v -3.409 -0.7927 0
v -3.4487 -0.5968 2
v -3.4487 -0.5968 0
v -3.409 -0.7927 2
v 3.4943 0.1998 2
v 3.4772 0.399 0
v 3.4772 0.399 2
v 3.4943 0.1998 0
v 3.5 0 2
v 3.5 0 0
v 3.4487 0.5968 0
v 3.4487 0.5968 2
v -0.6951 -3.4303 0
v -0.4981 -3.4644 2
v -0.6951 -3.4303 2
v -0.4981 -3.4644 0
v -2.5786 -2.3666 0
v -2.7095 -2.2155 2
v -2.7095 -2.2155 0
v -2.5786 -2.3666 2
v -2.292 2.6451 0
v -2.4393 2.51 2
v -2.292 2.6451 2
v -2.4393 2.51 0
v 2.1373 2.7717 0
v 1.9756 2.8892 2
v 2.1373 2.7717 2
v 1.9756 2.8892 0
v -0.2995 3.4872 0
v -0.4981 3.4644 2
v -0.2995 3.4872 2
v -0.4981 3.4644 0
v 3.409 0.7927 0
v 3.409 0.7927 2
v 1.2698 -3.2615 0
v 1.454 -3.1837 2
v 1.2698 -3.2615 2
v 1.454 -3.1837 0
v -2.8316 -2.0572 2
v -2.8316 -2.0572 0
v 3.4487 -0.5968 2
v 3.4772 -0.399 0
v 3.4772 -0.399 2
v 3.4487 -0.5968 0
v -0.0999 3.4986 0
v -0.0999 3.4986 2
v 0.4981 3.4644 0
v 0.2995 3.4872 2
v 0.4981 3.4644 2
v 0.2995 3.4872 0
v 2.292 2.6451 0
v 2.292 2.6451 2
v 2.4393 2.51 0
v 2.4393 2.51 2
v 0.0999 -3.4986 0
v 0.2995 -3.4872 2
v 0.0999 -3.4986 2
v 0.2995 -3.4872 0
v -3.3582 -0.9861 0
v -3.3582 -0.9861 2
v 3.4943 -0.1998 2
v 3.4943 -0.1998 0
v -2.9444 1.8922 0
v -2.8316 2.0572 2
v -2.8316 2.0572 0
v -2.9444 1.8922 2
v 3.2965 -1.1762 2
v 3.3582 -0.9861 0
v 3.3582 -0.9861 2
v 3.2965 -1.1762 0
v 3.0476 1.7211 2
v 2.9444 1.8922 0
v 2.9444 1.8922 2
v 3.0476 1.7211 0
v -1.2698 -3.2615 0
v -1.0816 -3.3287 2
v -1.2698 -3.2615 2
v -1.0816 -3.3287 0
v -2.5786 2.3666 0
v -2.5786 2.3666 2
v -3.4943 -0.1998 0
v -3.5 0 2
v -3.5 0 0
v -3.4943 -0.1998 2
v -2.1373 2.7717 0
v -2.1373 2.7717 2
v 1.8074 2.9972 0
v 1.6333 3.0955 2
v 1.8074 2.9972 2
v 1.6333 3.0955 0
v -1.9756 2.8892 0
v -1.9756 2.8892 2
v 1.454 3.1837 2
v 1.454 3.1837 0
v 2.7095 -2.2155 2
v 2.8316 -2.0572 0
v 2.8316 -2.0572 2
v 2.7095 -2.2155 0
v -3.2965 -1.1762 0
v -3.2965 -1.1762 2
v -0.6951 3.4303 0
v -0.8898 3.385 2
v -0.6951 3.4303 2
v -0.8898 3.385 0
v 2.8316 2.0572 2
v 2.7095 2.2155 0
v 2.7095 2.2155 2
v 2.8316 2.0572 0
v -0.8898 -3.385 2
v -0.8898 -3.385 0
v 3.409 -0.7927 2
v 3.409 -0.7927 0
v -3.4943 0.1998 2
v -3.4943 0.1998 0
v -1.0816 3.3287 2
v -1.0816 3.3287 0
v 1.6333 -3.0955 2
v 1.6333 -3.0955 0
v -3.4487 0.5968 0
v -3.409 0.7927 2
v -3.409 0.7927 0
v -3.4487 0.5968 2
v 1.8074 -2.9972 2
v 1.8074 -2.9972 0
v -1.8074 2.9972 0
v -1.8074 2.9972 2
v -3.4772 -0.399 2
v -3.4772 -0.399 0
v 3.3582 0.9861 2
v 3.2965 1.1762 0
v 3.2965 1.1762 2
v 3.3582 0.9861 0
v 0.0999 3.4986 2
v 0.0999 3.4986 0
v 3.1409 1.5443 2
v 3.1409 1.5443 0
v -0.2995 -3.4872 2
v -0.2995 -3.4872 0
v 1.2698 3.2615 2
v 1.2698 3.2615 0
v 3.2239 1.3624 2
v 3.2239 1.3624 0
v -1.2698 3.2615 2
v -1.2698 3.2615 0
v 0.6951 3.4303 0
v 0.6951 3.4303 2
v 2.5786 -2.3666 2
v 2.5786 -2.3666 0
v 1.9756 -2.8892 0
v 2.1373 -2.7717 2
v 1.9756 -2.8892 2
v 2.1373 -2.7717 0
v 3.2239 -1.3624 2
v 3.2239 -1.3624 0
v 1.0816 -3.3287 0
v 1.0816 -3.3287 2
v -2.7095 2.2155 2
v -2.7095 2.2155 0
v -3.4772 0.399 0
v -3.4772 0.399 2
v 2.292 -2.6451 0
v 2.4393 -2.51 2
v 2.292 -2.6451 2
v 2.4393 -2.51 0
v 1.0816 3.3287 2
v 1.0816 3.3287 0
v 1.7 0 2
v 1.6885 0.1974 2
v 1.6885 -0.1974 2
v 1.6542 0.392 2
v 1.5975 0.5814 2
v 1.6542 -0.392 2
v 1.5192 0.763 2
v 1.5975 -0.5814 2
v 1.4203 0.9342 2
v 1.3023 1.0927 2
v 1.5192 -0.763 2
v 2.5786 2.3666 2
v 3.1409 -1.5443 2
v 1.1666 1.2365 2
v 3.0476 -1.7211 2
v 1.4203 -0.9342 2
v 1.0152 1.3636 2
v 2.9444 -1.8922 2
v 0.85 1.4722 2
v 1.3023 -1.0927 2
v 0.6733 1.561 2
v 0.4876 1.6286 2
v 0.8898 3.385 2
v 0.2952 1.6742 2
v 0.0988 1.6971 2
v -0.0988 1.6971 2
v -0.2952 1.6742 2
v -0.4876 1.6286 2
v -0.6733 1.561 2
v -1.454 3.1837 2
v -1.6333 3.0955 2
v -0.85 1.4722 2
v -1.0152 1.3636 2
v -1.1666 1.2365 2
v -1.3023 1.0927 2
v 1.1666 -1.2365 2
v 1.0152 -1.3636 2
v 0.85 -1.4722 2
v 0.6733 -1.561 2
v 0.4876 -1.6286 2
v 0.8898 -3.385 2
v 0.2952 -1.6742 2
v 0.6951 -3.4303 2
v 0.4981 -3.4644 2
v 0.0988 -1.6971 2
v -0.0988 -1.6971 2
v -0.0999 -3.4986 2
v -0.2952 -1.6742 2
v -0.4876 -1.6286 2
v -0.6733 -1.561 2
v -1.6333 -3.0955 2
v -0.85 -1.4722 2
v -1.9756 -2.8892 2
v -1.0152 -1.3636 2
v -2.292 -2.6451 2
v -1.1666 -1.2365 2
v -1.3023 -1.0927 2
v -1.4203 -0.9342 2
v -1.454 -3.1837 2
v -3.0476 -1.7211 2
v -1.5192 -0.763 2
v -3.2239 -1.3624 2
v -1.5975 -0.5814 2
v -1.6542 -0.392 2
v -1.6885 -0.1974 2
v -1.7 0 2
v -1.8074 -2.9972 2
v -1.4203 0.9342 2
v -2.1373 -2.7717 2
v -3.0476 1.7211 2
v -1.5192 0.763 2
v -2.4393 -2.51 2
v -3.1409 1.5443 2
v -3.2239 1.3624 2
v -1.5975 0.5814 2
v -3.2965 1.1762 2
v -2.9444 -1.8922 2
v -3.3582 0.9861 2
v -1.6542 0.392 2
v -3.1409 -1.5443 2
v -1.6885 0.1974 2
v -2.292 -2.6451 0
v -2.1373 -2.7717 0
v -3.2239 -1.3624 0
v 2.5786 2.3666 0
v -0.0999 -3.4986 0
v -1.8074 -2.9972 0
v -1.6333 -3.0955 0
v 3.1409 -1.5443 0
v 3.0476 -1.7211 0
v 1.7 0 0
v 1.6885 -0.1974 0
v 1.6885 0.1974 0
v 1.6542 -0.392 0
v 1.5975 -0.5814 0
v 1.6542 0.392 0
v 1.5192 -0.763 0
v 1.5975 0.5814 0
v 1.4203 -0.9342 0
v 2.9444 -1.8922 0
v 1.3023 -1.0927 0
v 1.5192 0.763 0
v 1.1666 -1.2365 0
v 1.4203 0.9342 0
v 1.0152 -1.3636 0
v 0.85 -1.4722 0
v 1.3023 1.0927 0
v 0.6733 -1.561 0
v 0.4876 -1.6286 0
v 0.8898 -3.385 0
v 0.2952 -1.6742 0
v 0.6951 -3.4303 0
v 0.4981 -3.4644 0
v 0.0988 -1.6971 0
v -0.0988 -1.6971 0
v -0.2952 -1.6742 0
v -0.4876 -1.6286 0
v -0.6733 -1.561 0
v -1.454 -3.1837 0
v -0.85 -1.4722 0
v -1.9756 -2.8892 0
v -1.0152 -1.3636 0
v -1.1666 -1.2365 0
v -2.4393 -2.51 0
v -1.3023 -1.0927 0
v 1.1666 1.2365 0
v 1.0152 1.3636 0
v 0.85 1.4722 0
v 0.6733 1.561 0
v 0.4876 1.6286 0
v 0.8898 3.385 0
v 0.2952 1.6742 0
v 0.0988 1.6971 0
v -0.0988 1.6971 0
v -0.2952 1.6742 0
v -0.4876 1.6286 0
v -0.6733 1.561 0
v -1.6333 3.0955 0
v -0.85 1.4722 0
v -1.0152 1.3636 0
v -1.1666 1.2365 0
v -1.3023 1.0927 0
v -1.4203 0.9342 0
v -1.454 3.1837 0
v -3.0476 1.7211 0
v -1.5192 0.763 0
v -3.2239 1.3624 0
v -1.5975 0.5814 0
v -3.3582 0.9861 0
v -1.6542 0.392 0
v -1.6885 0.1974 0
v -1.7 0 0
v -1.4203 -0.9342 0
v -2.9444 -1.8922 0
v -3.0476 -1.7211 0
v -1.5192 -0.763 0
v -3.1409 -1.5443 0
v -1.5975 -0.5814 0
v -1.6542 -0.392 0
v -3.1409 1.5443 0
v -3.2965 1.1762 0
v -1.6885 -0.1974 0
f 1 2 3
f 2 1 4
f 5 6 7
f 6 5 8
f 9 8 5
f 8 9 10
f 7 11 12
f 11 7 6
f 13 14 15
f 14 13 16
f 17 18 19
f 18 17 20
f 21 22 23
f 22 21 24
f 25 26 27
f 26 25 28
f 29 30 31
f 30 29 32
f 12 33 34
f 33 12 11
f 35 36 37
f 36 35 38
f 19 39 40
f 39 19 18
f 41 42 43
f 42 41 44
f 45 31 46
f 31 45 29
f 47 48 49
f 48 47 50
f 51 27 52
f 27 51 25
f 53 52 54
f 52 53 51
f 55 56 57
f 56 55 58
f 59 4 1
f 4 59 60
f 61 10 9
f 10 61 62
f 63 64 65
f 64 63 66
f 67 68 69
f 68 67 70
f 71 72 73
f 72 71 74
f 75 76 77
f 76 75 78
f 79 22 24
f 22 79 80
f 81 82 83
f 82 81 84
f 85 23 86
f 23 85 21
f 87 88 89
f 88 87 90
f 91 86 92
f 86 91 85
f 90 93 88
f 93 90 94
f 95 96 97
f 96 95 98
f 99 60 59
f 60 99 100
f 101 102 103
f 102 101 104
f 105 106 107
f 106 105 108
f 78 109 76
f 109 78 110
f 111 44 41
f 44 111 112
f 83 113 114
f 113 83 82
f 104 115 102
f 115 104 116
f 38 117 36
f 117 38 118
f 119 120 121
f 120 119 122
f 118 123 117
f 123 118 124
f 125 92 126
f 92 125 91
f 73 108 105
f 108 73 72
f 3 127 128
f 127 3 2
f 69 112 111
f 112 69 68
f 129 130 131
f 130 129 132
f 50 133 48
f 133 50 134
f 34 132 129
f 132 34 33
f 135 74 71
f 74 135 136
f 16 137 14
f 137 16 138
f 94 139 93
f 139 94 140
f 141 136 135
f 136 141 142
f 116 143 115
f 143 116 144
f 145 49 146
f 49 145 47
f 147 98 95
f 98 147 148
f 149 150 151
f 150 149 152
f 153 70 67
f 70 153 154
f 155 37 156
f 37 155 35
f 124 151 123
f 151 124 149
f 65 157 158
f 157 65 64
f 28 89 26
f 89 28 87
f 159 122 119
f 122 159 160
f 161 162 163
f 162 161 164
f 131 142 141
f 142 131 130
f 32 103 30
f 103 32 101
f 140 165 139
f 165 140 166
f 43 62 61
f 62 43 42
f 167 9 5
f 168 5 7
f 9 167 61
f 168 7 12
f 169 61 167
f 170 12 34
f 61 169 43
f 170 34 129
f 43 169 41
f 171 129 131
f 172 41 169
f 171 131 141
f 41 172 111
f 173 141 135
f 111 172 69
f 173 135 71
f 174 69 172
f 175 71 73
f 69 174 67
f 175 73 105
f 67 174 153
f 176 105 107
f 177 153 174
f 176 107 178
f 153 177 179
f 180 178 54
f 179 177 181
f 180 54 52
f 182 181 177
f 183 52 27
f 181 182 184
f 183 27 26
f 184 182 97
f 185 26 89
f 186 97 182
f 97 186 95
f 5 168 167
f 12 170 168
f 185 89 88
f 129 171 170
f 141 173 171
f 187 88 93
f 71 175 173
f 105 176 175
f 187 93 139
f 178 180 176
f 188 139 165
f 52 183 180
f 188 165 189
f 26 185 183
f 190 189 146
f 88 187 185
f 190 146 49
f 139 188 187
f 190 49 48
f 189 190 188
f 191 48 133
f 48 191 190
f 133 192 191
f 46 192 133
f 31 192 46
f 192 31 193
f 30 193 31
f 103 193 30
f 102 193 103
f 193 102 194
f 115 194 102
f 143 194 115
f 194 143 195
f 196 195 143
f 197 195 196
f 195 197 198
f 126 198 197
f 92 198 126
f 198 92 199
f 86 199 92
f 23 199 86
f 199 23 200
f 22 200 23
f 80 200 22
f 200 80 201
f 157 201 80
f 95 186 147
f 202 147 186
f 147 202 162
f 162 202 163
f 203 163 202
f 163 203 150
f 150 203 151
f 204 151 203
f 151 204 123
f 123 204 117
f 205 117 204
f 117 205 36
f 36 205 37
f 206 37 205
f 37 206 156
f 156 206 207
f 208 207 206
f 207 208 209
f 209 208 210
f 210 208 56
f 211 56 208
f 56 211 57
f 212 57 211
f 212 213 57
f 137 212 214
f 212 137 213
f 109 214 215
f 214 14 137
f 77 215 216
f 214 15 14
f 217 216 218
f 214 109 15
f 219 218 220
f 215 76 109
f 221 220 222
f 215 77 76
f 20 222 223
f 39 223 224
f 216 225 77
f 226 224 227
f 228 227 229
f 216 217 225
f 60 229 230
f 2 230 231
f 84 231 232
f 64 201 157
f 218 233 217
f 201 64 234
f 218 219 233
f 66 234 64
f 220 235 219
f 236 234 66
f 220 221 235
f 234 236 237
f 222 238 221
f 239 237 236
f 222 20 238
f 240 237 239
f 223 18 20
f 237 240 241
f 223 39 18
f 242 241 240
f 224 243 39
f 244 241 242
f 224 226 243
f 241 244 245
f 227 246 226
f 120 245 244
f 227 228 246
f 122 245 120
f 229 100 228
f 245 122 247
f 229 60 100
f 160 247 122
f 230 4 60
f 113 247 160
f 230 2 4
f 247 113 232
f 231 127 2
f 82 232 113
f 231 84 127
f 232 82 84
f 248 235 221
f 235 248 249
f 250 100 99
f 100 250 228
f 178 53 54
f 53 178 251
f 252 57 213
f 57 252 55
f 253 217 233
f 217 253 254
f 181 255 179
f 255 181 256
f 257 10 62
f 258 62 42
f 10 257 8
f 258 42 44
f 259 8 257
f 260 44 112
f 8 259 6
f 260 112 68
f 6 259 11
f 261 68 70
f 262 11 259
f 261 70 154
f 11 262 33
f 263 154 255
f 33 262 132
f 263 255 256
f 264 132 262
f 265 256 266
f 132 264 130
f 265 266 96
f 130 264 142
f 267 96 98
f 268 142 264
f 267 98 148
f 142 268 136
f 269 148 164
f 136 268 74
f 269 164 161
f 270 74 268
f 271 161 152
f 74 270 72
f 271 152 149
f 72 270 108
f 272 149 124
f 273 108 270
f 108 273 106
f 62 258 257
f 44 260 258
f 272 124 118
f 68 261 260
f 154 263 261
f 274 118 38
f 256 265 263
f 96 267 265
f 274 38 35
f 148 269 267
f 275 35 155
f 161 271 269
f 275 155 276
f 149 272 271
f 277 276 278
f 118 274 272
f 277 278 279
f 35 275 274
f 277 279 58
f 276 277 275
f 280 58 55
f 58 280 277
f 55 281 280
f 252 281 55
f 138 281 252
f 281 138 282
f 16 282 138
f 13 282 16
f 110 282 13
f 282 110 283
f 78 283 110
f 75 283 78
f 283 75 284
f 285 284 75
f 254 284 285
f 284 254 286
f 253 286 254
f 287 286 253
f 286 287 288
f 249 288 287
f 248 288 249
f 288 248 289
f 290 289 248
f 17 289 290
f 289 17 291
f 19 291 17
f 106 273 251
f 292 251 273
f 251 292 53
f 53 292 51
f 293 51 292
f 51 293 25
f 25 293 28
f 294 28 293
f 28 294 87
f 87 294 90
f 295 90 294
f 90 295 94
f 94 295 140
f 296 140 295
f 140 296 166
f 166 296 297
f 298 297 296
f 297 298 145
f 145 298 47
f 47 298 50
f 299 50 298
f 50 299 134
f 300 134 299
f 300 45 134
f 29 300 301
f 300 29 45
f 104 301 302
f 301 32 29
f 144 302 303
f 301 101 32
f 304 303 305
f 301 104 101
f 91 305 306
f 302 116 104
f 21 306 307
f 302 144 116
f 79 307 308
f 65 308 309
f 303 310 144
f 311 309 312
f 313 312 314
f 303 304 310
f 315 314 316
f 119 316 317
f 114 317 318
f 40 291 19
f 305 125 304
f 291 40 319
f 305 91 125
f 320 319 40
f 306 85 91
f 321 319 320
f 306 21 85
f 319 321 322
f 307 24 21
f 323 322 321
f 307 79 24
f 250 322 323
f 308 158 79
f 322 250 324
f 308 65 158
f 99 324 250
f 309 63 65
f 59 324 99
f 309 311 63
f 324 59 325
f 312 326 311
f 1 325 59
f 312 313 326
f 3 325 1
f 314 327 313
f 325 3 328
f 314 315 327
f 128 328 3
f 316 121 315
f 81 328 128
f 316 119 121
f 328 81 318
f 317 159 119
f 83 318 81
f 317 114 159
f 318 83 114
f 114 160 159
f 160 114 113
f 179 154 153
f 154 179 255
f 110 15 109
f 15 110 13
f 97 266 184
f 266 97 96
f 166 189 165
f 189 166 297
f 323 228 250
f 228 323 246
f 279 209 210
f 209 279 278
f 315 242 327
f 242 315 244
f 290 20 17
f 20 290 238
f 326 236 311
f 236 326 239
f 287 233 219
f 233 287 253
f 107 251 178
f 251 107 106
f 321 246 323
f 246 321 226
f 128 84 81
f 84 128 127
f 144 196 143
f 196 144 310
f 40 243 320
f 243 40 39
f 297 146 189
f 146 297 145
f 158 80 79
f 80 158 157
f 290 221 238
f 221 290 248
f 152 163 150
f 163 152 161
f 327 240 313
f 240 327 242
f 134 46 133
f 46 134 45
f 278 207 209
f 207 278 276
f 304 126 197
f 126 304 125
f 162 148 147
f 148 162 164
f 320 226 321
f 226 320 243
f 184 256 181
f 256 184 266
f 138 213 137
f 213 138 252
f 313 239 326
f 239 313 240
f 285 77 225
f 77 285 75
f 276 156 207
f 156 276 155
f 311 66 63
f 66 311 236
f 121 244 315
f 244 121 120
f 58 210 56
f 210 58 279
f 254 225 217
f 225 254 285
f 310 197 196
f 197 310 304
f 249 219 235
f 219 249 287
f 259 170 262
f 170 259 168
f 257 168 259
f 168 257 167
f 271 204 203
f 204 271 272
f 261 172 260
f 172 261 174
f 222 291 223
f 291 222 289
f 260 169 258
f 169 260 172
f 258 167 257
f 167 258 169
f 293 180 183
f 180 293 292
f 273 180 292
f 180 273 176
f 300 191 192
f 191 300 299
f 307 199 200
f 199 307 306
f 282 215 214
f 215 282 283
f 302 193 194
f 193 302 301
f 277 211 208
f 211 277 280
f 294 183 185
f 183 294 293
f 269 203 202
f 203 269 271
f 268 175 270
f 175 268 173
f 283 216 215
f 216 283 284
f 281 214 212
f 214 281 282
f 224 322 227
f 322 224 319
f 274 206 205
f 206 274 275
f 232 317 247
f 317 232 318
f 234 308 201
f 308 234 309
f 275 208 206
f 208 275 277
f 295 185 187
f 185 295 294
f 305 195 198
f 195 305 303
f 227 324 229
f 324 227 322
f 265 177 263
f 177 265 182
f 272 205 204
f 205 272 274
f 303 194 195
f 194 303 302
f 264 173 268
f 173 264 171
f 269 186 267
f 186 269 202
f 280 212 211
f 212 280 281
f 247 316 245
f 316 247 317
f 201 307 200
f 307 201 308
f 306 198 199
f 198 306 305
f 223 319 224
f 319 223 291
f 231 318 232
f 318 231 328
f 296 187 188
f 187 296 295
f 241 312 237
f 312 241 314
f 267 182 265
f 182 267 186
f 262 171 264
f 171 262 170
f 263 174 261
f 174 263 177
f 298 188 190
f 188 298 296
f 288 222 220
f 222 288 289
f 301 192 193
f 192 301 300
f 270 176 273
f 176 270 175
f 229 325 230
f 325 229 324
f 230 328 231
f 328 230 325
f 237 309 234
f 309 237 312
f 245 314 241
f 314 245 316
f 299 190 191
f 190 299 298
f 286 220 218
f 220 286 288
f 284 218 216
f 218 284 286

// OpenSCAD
$fa = 0.2;
$fs = 0.2;

/*
linear_extrude(2)
difference() {
circle(d = 8);

circle(d = 3.4);
}*/


module washer(flat = true) {
    difference() {
        cylinder(d = 7, h = 2);
        cylinder(d1 = 3.4, d2 = flat ? 3.4 : 6, h = 2);
    }
    
}

washer(true);
//washer(false);
